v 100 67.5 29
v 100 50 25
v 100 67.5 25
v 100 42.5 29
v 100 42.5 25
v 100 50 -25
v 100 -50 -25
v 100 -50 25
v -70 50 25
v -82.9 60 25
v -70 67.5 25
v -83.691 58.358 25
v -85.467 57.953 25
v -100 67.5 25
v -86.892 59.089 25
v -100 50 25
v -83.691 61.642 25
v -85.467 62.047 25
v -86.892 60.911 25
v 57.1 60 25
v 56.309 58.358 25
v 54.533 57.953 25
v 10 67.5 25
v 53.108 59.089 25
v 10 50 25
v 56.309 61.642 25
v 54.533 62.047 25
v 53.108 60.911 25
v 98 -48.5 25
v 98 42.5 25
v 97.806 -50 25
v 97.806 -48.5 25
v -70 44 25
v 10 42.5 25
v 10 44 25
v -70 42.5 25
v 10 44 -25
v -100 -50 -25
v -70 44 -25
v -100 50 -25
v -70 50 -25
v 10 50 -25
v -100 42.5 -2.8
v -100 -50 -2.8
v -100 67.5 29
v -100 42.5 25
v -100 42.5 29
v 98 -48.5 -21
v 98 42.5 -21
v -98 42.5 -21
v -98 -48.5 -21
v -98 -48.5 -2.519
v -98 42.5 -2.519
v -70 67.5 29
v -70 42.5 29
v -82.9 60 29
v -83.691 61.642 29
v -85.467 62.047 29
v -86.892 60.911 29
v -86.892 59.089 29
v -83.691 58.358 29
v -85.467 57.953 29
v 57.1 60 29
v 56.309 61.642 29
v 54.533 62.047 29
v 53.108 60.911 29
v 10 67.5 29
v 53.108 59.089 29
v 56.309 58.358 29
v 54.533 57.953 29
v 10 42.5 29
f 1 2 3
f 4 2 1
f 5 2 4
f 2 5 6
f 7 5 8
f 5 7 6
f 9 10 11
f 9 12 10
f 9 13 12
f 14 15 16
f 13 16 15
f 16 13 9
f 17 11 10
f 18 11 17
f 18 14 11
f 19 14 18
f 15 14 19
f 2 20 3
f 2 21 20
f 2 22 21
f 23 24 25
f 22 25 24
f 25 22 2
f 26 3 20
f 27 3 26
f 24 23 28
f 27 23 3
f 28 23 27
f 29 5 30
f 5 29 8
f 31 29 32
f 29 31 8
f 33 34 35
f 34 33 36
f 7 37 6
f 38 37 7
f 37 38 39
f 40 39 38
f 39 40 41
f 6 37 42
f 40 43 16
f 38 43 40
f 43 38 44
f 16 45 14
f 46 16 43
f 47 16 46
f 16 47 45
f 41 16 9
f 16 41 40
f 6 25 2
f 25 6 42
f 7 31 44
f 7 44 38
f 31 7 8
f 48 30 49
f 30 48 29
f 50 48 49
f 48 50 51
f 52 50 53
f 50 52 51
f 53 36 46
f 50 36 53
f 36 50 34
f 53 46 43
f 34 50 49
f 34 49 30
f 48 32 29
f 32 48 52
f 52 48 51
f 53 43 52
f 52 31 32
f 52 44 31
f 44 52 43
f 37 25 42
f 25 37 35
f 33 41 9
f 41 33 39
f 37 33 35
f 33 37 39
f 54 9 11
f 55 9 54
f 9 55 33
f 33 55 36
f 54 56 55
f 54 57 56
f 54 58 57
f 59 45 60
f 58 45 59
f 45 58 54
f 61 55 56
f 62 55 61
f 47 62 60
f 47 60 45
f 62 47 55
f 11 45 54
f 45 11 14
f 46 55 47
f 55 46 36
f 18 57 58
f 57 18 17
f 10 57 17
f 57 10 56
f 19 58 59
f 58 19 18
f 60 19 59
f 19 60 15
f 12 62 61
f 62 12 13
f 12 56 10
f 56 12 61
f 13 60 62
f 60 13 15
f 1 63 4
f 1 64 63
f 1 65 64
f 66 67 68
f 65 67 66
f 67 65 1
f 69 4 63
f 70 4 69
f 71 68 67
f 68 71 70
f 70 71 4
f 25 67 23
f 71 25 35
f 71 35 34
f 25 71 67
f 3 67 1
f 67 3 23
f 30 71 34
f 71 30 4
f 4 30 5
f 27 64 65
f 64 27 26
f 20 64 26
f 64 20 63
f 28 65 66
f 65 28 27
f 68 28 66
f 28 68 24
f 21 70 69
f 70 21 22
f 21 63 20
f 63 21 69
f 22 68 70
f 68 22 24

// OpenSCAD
/*
Zubehoerschale-OpenSCAD by Sven Reddemann is licensed under a Creative Commons Attribution-NonCommercial-ShareAlike 4.0 International License.
To view a copy of this license, visit http://creativecommons.org/licenses/by-nc-sa/4.0/.
Based on a work at https://github.com/k37z3r/Zubehoerschale-OpenSCAD.
*/
difference(){
    cube([200,100,50], center=true);
    translate([0,-3,4]) cube([196,91,50], center=true);
    translate([0,-7.5,36.5]) rotate([0,-8,0])color("yellow") cube([300,100,50], center=true);
    translate([-30,49,4]) cube([80,10,60], center=true);
}
difference(){
    translate([-85,55,27]) cube([30,25,4], center=true);
    translate([-85,60,27]) cylinder(h=10, r=2.1, center=true);
}
difference(){
    translate([55,55,27]) cube([90,25,4], center=true);
    translate([55,60,27]) cylinder(h=10, r=2.1, center=true);
}
